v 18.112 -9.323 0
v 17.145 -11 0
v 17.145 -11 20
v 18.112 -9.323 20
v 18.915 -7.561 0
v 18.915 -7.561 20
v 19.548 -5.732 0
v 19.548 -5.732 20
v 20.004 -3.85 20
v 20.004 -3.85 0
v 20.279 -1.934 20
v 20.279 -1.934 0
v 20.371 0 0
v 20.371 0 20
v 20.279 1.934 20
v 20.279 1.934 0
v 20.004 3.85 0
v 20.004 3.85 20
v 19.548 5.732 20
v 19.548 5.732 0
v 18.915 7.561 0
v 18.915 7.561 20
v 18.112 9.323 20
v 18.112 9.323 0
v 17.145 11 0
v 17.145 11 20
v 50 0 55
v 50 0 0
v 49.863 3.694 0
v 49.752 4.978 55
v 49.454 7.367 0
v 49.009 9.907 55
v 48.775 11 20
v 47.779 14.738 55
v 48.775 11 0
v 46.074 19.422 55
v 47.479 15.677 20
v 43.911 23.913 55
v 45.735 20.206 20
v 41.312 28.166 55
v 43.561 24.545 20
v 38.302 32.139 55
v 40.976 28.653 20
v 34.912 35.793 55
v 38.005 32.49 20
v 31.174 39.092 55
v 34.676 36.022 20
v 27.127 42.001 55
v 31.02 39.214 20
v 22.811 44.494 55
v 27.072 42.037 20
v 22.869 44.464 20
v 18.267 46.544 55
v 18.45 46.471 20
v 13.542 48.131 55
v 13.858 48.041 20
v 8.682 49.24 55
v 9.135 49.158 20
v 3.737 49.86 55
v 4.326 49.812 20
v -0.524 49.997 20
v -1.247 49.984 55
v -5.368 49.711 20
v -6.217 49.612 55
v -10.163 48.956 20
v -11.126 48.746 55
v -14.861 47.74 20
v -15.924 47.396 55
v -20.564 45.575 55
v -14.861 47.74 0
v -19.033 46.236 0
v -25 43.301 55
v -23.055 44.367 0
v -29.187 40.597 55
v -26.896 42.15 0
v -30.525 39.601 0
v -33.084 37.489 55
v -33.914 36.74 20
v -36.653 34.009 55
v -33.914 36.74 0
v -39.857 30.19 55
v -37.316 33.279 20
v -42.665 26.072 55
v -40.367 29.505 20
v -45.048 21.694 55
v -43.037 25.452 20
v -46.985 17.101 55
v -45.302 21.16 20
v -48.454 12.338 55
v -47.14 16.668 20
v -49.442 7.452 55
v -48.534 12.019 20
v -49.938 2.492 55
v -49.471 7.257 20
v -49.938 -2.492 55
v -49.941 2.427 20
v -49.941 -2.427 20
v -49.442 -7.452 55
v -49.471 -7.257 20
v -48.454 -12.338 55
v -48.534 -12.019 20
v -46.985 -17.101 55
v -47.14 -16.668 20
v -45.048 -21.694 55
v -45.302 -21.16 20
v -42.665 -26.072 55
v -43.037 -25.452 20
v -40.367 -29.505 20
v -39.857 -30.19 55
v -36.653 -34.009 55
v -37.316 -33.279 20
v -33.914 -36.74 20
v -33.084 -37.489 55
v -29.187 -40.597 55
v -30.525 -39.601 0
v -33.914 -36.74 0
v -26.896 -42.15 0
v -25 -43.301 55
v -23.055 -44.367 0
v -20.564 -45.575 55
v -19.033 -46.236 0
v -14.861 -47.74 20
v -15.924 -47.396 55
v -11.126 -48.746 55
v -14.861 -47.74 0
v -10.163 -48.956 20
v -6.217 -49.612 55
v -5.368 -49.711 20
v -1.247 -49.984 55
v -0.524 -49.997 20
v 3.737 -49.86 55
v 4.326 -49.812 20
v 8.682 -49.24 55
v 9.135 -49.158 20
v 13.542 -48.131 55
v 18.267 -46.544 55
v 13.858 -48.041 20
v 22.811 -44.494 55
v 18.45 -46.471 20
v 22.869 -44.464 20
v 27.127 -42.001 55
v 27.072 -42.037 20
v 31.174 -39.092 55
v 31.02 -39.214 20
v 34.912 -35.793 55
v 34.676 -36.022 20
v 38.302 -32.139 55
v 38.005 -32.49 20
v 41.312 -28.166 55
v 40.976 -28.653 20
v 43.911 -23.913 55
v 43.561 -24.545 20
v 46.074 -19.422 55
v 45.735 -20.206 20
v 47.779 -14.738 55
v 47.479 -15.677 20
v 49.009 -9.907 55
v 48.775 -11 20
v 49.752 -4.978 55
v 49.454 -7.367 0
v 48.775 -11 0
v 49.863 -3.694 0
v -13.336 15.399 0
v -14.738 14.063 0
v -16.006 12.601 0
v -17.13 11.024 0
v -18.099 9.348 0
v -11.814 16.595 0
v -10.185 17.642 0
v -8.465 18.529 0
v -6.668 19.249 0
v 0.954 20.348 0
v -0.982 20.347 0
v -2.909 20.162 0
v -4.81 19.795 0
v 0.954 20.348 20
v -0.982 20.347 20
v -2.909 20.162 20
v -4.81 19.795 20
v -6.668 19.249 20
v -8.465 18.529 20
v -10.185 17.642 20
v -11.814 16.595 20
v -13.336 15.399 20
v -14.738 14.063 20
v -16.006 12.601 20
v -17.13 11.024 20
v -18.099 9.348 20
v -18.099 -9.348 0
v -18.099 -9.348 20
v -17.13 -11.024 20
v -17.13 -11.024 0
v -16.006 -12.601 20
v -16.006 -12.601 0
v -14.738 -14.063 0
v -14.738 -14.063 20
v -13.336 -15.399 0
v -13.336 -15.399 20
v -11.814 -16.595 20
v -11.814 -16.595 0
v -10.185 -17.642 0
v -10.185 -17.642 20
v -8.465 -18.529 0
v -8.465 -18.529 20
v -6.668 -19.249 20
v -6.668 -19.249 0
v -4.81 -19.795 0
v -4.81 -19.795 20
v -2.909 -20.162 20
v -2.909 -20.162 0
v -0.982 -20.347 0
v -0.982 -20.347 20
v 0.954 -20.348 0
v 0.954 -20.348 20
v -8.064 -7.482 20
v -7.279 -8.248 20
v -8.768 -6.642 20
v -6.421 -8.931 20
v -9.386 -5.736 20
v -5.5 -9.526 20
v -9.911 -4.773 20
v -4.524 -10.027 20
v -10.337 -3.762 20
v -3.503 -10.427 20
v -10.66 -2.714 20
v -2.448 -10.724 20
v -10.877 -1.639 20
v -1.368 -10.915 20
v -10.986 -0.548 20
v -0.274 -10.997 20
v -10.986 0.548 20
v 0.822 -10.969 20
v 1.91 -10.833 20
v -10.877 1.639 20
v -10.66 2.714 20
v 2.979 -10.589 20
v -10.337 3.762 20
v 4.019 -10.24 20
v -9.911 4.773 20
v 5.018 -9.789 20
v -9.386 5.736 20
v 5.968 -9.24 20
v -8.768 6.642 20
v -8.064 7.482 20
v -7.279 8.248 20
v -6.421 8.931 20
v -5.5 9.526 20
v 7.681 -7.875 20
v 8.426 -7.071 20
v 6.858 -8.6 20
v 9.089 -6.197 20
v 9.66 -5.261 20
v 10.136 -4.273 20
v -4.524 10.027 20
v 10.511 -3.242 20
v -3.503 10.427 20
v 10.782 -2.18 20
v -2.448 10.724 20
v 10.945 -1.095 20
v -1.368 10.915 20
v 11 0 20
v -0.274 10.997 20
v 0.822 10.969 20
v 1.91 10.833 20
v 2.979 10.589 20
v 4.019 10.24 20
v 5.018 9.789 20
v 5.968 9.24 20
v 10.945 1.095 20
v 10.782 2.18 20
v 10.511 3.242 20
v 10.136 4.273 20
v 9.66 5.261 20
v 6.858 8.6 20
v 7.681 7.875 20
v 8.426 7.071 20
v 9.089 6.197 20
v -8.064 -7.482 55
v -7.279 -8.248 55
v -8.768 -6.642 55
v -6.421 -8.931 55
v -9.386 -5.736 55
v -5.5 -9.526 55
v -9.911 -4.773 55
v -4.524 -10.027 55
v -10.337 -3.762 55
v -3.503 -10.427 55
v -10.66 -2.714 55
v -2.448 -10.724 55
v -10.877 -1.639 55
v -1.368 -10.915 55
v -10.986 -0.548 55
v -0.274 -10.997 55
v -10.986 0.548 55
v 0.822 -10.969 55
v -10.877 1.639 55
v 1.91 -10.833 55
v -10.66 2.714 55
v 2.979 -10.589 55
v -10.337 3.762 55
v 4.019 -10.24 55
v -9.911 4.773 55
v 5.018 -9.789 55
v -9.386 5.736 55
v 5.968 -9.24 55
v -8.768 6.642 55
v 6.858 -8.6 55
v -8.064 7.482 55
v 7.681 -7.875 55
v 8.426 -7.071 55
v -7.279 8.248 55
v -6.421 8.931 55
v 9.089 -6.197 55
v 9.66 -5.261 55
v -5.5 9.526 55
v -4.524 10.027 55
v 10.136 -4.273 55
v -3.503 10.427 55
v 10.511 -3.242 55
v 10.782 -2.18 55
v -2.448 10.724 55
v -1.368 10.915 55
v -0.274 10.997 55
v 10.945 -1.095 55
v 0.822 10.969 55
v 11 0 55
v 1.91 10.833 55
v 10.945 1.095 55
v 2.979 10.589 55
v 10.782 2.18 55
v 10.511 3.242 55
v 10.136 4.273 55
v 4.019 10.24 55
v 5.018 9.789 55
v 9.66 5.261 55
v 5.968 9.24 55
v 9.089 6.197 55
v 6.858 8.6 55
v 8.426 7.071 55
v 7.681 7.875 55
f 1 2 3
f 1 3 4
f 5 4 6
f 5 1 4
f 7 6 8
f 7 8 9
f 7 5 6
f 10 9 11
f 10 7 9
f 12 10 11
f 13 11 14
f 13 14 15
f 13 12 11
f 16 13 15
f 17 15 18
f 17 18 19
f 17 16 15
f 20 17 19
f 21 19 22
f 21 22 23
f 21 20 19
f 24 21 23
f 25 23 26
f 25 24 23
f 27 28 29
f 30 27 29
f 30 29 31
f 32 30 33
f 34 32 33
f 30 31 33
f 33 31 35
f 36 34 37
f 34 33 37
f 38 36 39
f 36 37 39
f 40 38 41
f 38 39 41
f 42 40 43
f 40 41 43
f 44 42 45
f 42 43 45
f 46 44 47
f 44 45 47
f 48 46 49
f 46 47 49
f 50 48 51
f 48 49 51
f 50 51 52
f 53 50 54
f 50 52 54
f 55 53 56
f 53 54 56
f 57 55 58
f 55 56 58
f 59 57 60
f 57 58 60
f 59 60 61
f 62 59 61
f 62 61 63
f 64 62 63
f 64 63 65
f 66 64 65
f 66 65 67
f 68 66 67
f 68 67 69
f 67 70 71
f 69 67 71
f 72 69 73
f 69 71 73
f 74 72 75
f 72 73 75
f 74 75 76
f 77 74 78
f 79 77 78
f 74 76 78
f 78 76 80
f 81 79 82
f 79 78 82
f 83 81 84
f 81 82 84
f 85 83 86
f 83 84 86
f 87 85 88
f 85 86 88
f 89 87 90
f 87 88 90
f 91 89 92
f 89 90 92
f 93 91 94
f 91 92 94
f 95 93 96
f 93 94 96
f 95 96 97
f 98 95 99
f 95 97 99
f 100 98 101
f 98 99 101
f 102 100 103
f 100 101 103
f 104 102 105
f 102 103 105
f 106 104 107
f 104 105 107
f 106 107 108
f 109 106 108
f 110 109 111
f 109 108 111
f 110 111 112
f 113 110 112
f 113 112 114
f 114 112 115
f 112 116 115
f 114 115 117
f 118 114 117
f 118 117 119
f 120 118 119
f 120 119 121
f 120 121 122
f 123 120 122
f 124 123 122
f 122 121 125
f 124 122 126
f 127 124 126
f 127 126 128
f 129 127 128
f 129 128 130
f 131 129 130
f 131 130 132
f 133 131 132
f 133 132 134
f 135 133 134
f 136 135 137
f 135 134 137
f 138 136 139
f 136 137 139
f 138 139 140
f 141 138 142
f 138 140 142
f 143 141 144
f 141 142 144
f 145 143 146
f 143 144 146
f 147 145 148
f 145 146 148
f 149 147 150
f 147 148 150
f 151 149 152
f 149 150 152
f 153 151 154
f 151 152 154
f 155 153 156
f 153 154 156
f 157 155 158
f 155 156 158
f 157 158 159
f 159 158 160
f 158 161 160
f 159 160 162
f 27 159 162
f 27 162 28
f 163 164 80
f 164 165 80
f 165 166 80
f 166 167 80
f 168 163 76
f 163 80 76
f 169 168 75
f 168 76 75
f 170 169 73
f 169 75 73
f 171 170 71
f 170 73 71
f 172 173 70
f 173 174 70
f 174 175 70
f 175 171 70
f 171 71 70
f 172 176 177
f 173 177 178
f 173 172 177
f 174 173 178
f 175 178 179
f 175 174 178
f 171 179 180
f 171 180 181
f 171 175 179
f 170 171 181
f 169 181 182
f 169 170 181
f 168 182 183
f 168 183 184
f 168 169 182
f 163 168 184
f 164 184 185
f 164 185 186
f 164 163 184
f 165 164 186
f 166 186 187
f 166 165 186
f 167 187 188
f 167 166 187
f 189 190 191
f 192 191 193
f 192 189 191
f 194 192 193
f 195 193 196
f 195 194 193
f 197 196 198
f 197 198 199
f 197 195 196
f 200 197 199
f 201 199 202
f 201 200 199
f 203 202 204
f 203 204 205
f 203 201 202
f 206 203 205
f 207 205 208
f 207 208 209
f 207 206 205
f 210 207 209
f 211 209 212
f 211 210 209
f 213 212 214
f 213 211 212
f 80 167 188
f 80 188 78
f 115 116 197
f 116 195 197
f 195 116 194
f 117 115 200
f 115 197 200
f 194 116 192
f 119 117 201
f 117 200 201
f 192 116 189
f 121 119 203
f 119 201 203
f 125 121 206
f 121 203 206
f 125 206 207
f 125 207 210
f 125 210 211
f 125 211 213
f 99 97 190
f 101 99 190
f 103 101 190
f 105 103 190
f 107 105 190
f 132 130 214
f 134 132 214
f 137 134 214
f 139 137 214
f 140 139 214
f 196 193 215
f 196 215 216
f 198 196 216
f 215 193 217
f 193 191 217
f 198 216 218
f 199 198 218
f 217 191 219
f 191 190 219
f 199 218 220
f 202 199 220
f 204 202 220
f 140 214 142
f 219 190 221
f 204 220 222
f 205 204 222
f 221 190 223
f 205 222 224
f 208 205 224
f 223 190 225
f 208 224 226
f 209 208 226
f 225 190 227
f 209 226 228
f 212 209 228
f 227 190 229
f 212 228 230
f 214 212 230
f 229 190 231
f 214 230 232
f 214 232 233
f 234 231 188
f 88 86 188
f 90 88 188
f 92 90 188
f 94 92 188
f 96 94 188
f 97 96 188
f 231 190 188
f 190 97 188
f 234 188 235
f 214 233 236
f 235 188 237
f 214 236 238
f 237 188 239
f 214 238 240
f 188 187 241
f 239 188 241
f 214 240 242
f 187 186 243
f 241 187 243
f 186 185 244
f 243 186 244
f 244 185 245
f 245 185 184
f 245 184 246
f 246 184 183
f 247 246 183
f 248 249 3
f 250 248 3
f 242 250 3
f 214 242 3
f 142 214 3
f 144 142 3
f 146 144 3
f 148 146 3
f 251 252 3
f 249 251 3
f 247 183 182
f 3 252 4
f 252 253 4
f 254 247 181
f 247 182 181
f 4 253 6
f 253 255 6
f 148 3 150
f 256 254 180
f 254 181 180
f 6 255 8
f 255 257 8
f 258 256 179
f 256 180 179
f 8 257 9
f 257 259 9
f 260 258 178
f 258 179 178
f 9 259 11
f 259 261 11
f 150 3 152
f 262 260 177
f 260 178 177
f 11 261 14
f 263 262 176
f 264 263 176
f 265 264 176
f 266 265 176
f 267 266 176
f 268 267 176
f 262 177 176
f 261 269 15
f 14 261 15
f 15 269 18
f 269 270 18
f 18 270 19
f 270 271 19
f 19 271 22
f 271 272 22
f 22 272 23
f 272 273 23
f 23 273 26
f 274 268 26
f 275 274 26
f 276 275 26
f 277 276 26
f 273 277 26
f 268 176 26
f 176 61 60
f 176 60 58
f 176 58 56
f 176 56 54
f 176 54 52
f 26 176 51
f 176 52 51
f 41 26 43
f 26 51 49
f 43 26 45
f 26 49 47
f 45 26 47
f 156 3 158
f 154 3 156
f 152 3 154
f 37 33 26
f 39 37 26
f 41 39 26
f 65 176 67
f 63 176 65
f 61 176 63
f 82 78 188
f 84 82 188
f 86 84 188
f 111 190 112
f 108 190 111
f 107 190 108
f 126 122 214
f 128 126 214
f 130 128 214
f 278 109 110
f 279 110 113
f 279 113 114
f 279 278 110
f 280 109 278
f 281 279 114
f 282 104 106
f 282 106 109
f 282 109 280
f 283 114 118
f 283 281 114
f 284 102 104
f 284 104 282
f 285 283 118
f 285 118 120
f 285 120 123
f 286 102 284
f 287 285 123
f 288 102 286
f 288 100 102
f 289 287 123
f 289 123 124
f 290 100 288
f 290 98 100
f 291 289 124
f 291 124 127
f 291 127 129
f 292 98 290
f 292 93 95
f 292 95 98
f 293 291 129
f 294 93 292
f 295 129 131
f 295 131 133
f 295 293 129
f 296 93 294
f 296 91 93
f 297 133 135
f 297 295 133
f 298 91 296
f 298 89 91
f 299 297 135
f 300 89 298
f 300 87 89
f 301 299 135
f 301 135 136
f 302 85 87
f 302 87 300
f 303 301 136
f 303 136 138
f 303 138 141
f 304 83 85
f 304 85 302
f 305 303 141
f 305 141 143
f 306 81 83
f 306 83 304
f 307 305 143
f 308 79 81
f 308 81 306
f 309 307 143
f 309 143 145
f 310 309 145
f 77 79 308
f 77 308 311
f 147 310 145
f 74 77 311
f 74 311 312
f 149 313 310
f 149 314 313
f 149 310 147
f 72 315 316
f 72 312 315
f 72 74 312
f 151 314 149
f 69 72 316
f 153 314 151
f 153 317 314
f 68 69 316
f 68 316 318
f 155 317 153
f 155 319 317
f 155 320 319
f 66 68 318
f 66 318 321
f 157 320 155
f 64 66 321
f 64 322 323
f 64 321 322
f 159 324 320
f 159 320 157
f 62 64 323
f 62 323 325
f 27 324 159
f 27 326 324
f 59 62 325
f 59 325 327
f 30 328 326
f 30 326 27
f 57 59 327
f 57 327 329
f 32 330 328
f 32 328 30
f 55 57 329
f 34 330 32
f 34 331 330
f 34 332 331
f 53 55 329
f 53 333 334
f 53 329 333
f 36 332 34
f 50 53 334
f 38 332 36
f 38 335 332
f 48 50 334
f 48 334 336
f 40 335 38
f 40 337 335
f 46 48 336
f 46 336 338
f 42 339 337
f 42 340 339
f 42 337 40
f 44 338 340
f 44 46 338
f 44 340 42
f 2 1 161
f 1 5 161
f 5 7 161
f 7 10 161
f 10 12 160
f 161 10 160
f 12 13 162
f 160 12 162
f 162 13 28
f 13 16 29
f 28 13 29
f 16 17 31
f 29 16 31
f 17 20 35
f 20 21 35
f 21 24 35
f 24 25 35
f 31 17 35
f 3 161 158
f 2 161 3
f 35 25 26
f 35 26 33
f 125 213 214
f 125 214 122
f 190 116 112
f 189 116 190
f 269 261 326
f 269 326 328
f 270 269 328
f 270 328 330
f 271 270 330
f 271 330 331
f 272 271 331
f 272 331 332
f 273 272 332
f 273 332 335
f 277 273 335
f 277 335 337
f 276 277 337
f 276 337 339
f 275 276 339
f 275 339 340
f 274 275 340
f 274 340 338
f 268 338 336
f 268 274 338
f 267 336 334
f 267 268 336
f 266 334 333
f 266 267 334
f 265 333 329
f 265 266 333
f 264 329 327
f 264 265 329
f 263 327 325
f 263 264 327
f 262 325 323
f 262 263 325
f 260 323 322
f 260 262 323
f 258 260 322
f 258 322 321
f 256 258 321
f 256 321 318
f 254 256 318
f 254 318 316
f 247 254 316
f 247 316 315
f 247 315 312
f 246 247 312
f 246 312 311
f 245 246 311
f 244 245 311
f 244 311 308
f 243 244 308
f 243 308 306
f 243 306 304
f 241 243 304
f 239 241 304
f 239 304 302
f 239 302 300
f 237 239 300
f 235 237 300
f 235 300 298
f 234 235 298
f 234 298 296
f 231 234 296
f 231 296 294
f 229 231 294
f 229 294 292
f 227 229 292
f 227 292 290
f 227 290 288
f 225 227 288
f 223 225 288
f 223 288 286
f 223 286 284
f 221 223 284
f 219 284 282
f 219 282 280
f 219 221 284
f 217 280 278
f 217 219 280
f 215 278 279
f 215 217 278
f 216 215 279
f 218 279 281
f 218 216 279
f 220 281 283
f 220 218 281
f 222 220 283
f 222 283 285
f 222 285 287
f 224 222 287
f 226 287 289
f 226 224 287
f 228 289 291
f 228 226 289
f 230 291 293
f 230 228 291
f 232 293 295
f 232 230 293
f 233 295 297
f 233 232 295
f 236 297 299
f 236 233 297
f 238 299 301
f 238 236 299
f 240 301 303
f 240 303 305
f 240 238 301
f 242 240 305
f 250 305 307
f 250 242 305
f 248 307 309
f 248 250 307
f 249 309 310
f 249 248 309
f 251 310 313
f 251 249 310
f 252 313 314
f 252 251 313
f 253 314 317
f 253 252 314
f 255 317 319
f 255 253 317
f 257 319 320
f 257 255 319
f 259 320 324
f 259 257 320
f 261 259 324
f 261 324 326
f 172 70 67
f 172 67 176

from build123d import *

# Parameters (mm, degrees)
SKETCH1_R           = 50
SKETCH1_R_2         = 11
BOSS_EXTRUDE1_DEPTH = 55
CUT_EXTRUDE2_DEPTH  = 20


with BuildPart() as part:
    # Sketch1 → Boss-Extrude1 (new body)
    with BuildSketch(Plane.XY):
        Circle(SKETCH1_R)
        Circle(SKETCH1_R_2, mode=Mode.SUBTRACT)
    extrude(amount=BOSS_EXTRUDE1_DEPTH)

    # Sketch3 → Cut-Extrude2 (cut)
    with BuildSketch(Plane(origin=(0, 0, 0), x_dir=(-1, 0, 0), z_dir=(0, 0, -1))):
        with BuildLine():
            Line((-48.774993593, -11), (-17.145475472, -11))
            ThreePointArc((-17.145475472, -11), (-20.370746897, 0), (-17.145475472, 11))
            Line((-17.145475472, 11), (-48.774993593, 11))
            ThreePointArc((-48.774993593, 11), (-25, 43.301270189), (14.861217355, 47.740383521))
            Line((14.861217355, 47.740383521), (-0.953541706, 20.348417319))
            ThreePointArc((-0.953541706, 20.348417319), (10.185373449, 17.641584307), (18.099017178, 9.348417319))
            Line((18.099017178, 9.348417319), (33.913776238, 36.740383521))
            ThreePointArc((33.913776238, 36.740383521), (50, 0), (33.913776238, -36.740383521))
            Line((33.913776238, -36.740383521), (18.099017178, -9.348417319))
            ThreePointArc((18.099017178, -9.348417319), (10.185373449, -17.641584307), (-0.953541706, -20.348417319))
            Line((-0.953541706, -20.348417319), (14.861217355, -47.740383521))
            ThreePointArc((14.861217355, -47.740383521), (-25, -43.301270189), (-48.774993593, -11))
        make_face()
    extrude(amount=-CUT_EXTRUDE2_DEPTH, mode=Mode.SUBTRACT)


solid = part.part
